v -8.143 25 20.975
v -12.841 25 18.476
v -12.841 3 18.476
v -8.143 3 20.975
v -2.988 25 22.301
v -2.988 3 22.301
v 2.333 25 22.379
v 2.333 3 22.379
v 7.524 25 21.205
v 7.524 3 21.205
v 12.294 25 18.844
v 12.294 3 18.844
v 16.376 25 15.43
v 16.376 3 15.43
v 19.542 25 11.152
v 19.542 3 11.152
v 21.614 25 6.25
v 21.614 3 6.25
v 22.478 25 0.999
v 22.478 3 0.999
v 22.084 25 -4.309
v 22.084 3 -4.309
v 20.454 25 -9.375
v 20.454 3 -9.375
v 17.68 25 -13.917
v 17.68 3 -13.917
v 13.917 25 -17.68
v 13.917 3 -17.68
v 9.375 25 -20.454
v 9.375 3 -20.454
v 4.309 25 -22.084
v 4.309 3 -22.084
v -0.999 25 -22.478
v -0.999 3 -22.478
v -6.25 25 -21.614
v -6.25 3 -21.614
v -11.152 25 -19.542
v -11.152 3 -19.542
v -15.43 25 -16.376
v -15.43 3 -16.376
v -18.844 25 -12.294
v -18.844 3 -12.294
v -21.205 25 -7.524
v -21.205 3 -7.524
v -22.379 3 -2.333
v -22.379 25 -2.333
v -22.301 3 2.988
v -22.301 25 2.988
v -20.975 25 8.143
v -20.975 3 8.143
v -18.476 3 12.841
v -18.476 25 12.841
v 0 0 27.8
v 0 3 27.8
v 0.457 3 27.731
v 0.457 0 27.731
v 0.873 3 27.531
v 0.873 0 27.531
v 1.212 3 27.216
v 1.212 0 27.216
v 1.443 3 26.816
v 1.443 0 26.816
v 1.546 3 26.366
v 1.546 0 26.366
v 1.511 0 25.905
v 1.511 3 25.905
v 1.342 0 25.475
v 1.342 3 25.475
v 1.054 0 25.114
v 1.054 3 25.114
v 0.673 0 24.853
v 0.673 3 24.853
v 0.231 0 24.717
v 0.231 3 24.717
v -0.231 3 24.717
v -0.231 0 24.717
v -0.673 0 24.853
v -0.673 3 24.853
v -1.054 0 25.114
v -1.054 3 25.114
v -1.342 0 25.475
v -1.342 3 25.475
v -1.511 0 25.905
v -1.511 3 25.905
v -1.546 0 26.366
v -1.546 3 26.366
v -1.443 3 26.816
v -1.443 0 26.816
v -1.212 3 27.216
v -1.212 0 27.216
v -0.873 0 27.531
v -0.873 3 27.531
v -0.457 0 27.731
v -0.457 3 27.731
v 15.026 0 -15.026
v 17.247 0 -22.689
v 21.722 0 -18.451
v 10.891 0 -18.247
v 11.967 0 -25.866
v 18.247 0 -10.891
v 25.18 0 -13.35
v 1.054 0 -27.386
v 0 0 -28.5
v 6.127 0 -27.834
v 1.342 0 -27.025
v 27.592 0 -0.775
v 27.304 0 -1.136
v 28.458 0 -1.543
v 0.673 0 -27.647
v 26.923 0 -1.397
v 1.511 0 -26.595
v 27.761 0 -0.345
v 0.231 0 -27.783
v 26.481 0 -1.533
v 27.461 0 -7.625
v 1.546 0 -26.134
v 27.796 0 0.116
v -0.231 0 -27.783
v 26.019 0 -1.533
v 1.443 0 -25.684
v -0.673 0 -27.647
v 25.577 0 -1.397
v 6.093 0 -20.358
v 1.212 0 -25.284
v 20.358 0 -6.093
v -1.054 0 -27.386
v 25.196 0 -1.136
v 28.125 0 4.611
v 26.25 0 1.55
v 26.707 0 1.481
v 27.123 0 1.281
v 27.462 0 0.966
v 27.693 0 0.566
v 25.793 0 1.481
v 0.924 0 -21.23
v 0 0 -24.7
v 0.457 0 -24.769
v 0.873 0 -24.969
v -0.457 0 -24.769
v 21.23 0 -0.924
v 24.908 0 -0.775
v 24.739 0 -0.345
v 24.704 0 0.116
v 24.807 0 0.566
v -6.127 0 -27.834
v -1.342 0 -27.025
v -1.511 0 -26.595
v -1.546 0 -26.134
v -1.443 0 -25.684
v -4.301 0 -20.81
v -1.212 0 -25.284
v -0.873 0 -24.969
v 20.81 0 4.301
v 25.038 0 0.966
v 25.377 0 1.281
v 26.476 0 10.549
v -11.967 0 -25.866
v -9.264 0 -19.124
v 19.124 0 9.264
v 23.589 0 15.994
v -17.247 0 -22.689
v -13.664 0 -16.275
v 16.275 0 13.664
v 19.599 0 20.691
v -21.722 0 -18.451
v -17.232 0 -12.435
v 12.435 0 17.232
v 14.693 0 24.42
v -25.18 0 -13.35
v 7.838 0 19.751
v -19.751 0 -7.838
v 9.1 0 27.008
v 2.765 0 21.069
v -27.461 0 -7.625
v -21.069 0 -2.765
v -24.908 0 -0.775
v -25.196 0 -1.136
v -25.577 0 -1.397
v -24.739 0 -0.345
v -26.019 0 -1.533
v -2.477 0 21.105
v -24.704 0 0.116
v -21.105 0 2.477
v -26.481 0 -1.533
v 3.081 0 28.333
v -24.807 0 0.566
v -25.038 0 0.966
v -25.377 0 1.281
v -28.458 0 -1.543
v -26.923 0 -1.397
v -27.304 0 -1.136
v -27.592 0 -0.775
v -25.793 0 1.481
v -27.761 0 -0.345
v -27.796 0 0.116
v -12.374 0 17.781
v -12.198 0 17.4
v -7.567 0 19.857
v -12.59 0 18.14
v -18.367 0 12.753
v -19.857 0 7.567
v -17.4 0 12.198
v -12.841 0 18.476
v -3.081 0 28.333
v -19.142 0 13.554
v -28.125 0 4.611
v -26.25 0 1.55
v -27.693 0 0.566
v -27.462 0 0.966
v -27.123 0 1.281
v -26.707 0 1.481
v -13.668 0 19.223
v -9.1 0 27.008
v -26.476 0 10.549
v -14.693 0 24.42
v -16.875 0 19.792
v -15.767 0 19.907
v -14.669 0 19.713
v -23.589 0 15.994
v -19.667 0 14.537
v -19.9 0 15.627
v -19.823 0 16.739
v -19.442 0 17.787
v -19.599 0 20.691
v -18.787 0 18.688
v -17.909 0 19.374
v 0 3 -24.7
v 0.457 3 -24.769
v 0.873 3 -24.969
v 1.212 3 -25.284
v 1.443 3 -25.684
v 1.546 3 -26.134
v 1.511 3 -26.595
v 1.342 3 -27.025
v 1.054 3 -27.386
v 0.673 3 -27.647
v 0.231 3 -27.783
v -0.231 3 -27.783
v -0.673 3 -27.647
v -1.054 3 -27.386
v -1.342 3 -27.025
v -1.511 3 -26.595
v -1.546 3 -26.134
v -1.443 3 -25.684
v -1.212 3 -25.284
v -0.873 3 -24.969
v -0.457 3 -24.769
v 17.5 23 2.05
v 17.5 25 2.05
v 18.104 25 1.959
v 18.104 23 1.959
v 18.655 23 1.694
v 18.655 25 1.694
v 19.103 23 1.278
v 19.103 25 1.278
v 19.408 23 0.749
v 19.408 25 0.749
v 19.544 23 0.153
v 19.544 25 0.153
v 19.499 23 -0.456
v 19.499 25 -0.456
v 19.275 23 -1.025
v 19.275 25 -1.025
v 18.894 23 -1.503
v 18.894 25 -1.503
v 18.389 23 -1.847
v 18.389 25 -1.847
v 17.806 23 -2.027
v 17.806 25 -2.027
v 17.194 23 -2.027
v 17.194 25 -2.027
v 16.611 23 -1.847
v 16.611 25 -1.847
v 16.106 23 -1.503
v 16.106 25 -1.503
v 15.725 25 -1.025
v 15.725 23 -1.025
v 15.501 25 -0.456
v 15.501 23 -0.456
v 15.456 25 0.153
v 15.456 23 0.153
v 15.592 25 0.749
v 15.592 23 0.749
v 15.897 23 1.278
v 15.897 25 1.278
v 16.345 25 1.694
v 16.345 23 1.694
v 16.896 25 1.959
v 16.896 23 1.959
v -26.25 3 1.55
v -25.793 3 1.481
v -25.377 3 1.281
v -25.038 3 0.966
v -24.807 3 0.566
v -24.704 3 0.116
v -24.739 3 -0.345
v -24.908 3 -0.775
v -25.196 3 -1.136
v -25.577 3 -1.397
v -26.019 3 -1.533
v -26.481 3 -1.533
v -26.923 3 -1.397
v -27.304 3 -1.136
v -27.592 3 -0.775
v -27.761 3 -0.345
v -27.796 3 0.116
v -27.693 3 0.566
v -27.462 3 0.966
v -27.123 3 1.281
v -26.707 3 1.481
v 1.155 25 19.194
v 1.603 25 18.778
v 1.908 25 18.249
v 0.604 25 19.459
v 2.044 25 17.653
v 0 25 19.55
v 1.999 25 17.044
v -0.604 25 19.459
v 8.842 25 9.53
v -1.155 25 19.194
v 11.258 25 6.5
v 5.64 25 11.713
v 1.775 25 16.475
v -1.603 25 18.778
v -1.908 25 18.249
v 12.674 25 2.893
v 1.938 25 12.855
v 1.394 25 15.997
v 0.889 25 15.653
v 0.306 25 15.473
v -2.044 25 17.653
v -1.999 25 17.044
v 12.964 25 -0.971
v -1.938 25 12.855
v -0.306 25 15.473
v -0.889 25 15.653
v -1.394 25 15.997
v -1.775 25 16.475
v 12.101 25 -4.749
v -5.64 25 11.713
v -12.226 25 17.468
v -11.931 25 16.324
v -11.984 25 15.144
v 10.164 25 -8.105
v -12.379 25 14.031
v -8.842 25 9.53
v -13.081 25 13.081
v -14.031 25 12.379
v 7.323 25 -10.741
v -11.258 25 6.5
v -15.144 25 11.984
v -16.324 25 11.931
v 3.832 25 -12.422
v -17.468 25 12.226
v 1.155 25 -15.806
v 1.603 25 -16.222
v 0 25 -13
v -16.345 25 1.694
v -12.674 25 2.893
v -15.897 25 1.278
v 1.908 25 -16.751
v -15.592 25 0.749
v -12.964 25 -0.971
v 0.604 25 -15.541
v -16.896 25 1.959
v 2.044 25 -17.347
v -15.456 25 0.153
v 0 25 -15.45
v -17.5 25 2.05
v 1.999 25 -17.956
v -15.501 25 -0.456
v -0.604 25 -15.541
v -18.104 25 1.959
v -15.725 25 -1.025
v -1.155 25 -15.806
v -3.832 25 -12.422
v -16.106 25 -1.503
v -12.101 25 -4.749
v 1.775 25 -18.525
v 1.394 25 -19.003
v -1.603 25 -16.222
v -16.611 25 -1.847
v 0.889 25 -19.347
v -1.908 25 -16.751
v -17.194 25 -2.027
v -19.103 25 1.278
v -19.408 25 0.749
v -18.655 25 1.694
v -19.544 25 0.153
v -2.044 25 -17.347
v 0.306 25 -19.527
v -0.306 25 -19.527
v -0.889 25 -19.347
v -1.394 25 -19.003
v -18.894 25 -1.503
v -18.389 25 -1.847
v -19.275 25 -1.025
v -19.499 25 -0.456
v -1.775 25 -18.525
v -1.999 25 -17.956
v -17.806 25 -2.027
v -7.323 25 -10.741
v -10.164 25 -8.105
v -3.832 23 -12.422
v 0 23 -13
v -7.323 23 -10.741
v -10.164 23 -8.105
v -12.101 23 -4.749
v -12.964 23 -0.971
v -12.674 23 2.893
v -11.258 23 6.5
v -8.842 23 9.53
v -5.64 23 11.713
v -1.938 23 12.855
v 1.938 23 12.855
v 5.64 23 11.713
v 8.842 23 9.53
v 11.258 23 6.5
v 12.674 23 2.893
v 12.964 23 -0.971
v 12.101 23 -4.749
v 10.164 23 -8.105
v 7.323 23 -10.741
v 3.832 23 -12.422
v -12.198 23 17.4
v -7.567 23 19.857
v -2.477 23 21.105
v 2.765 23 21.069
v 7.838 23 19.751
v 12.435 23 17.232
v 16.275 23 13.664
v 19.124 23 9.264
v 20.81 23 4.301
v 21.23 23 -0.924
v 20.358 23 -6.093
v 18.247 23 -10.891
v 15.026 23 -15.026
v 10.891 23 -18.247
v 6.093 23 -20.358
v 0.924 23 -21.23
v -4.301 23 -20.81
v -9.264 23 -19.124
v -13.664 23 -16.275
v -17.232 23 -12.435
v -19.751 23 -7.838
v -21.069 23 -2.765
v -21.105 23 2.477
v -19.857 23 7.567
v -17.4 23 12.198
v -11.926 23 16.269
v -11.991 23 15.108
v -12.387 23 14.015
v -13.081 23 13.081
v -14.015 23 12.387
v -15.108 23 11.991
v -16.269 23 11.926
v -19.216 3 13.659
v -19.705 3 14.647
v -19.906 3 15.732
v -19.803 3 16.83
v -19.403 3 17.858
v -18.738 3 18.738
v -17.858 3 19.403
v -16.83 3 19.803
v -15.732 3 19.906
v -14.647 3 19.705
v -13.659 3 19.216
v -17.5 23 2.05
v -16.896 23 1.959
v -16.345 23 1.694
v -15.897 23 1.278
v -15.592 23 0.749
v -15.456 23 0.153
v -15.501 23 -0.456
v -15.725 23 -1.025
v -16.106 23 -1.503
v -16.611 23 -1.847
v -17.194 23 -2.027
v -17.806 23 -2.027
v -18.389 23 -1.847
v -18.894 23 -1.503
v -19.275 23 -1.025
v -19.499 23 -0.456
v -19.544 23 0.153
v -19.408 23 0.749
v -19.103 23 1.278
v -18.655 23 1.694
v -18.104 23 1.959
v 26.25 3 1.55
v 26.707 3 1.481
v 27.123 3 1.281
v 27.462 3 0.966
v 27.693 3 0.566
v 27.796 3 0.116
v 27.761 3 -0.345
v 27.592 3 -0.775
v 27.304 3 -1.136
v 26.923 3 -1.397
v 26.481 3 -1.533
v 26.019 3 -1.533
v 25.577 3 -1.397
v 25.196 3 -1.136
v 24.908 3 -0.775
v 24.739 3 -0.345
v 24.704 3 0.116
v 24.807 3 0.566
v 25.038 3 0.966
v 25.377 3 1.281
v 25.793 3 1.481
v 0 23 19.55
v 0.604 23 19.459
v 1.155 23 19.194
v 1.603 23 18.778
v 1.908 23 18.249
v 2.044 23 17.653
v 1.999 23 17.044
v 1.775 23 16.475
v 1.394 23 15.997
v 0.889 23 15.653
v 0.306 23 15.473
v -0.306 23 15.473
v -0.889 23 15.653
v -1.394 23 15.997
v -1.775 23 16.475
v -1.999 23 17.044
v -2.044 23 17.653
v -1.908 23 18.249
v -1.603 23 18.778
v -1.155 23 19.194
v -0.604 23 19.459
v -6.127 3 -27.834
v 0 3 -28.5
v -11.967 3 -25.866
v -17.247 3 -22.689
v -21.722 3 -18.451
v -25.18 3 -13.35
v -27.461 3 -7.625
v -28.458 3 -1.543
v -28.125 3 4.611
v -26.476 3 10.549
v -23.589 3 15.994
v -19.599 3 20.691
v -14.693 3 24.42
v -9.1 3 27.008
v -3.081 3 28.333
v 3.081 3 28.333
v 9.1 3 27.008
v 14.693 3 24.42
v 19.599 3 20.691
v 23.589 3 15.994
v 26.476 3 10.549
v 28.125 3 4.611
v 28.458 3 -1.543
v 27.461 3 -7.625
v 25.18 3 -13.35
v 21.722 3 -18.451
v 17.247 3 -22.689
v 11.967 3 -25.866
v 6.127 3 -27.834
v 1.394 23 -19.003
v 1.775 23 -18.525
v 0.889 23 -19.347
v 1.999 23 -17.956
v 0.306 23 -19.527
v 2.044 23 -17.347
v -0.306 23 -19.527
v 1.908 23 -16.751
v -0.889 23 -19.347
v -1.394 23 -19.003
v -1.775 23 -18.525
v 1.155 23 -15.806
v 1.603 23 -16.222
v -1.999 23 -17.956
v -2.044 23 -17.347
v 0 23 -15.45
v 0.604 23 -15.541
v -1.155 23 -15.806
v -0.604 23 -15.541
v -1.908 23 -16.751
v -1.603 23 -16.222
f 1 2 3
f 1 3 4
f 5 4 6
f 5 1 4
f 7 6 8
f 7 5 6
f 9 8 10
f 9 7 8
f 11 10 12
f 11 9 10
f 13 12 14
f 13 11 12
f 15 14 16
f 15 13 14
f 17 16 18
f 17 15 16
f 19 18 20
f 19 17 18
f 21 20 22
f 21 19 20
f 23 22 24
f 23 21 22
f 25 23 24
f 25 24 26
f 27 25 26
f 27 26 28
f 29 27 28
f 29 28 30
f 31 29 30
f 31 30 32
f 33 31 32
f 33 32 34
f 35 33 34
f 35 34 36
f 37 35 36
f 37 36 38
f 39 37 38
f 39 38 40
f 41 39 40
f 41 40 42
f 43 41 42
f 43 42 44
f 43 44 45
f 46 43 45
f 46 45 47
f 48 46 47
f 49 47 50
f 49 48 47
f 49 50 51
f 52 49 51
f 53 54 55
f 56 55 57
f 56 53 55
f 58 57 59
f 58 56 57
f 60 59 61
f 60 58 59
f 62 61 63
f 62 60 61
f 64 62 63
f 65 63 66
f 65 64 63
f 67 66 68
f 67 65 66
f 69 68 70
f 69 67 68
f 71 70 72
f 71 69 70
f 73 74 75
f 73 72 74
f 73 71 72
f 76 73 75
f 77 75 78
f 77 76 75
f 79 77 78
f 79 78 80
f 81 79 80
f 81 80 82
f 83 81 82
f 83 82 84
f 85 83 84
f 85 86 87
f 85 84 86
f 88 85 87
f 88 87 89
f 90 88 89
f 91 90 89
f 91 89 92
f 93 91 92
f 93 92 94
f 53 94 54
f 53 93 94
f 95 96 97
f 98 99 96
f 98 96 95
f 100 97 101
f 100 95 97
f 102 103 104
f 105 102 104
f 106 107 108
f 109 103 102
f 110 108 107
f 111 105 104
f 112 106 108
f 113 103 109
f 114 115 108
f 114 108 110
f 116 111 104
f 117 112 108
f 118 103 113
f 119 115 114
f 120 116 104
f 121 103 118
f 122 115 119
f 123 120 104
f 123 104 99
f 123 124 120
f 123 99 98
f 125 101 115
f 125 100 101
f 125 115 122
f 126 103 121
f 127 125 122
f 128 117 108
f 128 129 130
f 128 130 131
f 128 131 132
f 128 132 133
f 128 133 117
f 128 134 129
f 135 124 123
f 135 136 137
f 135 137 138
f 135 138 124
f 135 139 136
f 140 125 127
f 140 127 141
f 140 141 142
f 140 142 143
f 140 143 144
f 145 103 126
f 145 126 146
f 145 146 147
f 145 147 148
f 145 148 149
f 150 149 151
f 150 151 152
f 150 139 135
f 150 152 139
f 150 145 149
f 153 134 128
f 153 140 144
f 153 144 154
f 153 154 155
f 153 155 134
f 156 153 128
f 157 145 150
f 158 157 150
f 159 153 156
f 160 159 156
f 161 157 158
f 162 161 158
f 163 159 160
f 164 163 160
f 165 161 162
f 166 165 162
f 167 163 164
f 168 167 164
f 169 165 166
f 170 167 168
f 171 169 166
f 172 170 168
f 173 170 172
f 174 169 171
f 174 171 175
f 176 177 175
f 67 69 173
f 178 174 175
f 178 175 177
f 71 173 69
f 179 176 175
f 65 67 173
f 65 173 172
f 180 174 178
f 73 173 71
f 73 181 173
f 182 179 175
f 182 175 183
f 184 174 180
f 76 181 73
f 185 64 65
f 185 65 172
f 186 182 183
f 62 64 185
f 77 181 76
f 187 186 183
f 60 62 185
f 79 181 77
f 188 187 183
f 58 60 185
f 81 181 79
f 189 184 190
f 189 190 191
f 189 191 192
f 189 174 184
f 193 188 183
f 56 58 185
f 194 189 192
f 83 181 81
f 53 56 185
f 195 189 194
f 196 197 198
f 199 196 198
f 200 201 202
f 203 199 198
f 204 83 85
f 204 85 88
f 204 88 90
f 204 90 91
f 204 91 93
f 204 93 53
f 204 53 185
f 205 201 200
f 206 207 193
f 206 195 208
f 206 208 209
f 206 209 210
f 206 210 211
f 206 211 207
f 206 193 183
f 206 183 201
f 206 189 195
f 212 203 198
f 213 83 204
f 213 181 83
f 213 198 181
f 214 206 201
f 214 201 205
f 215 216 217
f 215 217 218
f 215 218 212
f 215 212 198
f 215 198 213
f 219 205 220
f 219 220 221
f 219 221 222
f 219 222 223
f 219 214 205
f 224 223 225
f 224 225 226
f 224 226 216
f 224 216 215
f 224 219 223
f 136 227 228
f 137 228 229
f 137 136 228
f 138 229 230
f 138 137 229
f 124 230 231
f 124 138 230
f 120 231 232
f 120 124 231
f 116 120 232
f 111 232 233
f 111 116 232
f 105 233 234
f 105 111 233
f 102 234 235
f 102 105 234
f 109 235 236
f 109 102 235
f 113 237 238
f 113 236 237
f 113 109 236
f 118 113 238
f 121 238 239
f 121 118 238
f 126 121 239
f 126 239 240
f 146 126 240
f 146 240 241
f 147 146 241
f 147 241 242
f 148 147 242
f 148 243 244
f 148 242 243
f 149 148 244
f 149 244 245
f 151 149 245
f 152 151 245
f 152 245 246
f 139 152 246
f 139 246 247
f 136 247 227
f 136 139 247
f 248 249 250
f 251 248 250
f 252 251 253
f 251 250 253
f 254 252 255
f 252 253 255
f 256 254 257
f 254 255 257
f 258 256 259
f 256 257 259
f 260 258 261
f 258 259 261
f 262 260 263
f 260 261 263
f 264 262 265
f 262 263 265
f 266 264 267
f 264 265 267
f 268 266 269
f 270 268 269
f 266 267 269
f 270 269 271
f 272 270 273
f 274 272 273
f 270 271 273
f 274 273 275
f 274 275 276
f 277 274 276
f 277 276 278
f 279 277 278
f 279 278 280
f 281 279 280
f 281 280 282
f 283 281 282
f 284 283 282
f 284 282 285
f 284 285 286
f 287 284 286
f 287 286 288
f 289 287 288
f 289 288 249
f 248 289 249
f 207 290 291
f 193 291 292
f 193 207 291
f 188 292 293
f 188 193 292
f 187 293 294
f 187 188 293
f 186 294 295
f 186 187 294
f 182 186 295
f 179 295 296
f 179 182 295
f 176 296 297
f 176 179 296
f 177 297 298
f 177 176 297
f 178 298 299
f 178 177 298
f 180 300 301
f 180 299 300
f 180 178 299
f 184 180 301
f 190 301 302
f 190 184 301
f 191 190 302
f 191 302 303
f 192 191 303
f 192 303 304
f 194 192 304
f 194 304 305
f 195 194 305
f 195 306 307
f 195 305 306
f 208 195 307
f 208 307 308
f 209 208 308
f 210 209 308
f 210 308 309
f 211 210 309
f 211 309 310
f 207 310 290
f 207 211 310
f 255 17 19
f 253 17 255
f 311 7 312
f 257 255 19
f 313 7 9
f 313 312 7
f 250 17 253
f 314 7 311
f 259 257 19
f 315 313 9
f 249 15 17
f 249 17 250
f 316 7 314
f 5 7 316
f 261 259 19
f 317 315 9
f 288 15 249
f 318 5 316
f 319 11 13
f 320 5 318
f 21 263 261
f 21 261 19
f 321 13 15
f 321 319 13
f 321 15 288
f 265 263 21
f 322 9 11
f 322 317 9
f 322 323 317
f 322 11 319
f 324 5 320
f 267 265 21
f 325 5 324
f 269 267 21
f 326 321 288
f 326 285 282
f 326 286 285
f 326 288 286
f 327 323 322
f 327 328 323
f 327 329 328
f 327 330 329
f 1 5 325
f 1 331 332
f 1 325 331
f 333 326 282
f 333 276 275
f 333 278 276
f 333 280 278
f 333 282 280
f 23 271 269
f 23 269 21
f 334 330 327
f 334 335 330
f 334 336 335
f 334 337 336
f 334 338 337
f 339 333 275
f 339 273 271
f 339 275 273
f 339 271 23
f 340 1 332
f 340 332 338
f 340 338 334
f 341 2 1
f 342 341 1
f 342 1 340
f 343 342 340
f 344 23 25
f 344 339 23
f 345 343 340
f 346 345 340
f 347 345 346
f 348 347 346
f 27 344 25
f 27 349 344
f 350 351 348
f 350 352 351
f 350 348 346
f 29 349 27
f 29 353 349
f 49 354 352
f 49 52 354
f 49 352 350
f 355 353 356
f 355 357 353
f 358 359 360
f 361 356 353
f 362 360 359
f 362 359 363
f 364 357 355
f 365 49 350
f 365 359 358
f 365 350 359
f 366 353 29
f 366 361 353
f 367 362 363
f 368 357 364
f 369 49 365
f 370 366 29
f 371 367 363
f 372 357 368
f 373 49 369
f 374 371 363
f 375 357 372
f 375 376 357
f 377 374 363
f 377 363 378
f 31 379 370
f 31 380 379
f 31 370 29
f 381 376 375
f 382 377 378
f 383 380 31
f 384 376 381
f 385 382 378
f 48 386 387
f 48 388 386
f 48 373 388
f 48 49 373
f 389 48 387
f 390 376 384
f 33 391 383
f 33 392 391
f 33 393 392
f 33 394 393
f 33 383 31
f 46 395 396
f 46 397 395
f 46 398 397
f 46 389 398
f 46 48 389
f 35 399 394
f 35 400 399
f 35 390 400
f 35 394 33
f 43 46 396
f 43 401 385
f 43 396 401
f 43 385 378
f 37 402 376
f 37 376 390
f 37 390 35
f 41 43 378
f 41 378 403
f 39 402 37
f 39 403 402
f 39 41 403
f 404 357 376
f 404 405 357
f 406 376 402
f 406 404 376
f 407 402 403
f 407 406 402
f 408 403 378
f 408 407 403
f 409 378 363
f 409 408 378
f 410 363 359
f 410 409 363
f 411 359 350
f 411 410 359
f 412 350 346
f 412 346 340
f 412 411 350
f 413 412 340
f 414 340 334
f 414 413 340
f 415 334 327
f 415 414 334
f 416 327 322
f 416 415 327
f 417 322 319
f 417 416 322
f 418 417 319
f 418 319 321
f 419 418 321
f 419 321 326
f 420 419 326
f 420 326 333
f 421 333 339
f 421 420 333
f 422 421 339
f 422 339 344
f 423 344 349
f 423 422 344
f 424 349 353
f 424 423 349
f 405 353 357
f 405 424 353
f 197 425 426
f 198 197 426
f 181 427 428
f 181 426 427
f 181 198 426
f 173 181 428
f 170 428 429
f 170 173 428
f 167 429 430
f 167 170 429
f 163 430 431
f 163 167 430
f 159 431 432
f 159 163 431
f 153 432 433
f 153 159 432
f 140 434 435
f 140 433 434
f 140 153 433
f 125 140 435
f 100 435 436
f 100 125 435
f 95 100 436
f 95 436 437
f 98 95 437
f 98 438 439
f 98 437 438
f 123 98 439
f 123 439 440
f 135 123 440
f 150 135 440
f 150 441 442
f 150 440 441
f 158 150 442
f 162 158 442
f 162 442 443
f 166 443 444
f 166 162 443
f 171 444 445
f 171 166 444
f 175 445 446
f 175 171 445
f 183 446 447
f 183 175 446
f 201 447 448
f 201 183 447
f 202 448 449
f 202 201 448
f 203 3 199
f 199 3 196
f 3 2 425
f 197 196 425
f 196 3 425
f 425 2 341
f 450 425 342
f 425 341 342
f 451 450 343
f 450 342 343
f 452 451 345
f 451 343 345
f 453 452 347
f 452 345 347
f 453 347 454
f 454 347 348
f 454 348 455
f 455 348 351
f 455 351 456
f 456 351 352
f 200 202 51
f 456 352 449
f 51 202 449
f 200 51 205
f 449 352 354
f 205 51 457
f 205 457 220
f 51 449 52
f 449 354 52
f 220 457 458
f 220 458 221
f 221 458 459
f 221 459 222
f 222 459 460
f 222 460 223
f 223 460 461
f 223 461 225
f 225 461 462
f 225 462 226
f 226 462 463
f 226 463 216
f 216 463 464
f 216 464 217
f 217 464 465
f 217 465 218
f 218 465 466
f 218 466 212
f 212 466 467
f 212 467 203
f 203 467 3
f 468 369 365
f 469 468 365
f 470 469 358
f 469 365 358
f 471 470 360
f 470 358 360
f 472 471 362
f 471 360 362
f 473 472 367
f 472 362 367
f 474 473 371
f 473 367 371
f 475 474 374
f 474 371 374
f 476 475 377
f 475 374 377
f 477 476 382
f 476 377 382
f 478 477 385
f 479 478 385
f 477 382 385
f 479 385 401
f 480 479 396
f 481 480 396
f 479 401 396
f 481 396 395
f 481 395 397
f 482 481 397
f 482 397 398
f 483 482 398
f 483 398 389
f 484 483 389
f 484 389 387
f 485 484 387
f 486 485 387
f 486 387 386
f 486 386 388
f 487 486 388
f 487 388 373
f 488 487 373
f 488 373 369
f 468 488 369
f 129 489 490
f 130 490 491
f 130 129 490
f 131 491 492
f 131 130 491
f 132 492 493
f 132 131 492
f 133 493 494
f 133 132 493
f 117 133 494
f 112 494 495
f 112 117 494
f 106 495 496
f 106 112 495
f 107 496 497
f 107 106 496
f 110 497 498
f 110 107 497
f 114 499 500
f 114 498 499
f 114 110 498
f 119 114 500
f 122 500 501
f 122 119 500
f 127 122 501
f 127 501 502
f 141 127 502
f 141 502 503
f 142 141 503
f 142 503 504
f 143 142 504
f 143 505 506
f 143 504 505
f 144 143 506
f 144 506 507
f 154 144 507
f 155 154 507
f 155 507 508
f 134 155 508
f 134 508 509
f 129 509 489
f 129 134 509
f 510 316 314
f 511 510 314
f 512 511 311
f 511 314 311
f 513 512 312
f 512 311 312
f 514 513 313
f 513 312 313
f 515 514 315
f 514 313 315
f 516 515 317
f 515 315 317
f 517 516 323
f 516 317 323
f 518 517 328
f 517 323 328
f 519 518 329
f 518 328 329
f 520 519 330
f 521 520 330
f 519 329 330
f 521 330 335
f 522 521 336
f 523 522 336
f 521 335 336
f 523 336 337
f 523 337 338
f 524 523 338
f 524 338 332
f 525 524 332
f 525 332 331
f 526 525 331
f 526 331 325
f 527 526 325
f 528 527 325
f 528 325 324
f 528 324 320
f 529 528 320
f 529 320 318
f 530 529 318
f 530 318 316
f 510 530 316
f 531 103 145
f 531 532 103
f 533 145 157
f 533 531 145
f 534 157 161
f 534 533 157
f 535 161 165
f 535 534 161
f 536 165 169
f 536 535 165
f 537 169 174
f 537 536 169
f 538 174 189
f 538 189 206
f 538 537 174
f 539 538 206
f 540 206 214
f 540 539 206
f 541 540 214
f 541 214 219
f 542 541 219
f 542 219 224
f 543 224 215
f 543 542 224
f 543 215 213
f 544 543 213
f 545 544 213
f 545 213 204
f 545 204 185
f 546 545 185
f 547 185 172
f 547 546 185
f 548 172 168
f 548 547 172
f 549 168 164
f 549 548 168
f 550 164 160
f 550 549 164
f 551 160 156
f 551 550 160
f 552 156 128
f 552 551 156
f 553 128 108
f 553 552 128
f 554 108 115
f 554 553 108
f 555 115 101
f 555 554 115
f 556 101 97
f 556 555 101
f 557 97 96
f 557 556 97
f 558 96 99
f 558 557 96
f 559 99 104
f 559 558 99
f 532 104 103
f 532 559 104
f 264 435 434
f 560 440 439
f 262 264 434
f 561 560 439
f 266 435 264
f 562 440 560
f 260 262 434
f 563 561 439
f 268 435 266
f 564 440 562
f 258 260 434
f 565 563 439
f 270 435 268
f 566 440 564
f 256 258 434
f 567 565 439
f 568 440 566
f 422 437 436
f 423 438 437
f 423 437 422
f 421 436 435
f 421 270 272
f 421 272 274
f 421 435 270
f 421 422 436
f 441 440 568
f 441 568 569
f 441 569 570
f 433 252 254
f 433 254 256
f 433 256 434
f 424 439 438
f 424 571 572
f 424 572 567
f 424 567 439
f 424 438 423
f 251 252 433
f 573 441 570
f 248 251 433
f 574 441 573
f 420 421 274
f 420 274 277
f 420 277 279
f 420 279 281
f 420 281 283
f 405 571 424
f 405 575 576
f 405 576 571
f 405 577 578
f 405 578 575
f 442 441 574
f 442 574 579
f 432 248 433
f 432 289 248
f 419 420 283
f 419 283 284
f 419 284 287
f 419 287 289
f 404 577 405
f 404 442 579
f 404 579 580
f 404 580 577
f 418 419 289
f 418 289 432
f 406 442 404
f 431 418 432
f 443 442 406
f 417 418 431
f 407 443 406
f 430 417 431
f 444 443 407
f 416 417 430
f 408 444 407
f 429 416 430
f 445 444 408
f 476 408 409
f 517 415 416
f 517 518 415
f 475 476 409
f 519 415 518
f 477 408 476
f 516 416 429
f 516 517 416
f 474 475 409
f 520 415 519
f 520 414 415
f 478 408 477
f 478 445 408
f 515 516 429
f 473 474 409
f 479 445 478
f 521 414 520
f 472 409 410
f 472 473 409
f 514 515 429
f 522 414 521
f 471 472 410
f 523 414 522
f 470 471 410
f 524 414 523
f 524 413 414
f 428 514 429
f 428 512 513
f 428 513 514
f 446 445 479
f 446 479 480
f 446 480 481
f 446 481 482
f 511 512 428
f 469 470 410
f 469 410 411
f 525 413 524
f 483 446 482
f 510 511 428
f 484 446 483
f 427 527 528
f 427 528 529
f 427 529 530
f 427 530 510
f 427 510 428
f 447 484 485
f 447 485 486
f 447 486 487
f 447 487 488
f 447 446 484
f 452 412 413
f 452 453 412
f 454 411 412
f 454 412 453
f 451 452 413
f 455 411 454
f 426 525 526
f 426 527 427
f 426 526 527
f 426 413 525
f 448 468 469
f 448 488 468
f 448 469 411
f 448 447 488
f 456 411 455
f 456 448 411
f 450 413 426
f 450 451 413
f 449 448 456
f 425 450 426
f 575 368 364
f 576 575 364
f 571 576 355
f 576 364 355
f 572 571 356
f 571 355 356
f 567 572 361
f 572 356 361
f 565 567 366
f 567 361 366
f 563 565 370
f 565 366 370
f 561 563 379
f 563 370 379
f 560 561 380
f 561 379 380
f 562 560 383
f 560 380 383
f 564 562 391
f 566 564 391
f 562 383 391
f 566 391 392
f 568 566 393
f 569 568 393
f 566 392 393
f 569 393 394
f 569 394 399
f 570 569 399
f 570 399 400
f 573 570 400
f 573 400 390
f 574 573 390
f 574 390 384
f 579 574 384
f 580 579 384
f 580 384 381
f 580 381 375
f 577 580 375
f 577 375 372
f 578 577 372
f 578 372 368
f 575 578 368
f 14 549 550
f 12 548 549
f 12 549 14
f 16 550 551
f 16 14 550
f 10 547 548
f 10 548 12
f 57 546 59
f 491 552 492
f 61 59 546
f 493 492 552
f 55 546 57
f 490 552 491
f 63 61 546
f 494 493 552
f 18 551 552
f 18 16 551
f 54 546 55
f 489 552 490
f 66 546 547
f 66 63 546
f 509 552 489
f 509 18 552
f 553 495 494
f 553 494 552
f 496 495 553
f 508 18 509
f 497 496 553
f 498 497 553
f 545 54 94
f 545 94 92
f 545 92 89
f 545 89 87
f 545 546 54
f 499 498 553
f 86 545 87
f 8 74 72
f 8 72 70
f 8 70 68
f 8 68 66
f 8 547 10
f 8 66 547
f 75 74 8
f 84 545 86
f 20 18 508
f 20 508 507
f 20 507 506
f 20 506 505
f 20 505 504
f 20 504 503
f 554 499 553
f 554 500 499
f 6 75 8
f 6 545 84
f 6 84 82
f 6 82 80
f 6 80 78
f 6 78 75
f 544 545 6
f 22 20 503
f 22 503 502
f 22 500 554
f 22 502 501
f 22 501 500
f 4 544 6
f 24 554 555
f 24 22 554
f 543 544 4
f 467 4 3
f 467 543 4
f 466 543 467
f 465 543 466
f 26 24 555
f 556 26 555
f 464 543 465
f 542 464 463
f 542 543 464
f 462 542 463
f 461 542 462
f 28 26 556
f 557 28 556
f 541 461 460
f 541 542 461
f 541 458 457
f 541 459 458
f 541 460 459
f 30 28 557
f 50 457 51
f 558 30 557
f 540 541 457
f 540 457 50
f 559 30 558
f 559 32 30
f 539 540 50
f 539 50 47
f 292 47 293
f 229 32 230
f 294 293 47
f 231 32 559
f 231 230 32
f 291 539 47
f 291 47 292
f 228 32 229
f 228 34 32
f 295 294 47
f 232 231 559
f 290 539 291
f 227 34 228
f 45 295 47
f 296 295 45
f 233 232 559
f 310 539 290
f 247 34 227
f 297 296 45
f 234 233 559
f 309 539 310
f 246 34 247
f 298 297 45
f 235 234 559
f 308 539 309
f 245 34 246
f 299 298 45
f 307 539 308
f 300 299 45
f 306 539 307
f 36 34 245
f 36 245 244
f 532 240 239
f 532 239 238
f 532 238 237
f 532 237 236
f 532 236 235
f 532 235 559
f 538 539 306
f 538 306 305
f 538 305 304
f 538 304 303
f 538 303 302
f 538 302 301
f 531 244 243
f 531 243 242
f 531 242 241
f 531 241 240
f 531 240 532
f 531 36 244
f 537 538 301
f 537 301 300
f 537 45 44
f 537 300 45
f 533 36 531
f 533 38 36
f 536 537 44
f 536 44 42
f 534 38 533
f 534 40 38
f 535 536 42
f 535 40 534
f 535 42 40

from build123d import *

# Parameters (mm, degrees)
SKETCH_2_R          = 2.05
CUT_EXTRUDE_1_DEPTH = 10
SKETCH_3_R          = 1.55
CUT_EXTRUDE_3_DEPTH = 48.428894147
SKETCH_20_R         = 4
CUT_EXTRUDE_4_DEPTH = 29


with BuildPart() as part:
    # 草图1 → 旋转1 (revolve)
    with BuildSketch(Plane(origin=(0, 0, 0), x_dir=(0, 0, -1), z_dir=(1, 0, 0))):
        Polygon((13, 25), (13, 23), (21.25, 23), (21.25, 0), (28.5, 0), (28.5, 3), (22.5, 3), (22.5, 25), align=None)
    revolve(axis=Axis((0, 0, 0), (0, 1, 0)))

    # 草图2 → 切除-拉伸1 (cut)
    with BuildSketch(Plane(origin=(0, 25, 0), x_dir=(1, 0, 0), z_dir=(0, 1, 0))):
        with Locations(Location((0, 17.5, 0), (0, 0, 270))):
            Circle(SKETCH_2_R)
        with Locations(Location((17.5, 0, 0), (0, 0, 270))):
            Circle(SKETCH_2_R)
        with Locations(Location((0, -17.5, 0), (0, 0, 270))):
            Circle(SKETCH_2_R)
        with Locations(Location((-17.5, 0, 0), (0, 0, 270))):
            Circle(SKETCH_2_R)
    extrude(amount=-CUT_EXTRUDE_1_DEPTH, mode=Mode.SUBTRACT)

    # 草图3 → 切除-拉伸3 (cut, through all)
    with BuildSketch(Plane(origin=(0, 0, 0), x_dir=(1, 0, 0), z_dir=(0, 1, 0))):
        with Locations(Location((0, -26.25, 0), (0, 0, 270))):
            Circle(SKETCH_3_R)
        with Locations(Location((-26.25, 0, 0), (0, 0, 270))):
            Circle(SKETCH_3_R)
        with Locations(Location((0, 26.25, 0), (0, 0, 270))):
            Circle(SKETCH_3_R)
        with Locations(Location((26.25, 0, 0), (0, 0, 270))):
            Circle(SKETCH_3_R)
    extrude(amount=CUT_EXTRUDE_3_DEPTH, mode=Mode.SUBTRACT)

    # 草图20 → 切除-拉伸4 (cut)
    with BuildSketch(Plane(origin=(0, 25, 0), x_dir=(1, 0, 0), z_dir=(0, 1, 0))):
        with Locations(Location((-15.909902577, -15.909902577, 0), (0, 0, 320.099688914))):
            Circle(SKETCH_20_R)
    extrude(amount=-CUT_EXTRUDE_4_DEPTH, mode=Mode.SUBTRACT)


solid = part.part
